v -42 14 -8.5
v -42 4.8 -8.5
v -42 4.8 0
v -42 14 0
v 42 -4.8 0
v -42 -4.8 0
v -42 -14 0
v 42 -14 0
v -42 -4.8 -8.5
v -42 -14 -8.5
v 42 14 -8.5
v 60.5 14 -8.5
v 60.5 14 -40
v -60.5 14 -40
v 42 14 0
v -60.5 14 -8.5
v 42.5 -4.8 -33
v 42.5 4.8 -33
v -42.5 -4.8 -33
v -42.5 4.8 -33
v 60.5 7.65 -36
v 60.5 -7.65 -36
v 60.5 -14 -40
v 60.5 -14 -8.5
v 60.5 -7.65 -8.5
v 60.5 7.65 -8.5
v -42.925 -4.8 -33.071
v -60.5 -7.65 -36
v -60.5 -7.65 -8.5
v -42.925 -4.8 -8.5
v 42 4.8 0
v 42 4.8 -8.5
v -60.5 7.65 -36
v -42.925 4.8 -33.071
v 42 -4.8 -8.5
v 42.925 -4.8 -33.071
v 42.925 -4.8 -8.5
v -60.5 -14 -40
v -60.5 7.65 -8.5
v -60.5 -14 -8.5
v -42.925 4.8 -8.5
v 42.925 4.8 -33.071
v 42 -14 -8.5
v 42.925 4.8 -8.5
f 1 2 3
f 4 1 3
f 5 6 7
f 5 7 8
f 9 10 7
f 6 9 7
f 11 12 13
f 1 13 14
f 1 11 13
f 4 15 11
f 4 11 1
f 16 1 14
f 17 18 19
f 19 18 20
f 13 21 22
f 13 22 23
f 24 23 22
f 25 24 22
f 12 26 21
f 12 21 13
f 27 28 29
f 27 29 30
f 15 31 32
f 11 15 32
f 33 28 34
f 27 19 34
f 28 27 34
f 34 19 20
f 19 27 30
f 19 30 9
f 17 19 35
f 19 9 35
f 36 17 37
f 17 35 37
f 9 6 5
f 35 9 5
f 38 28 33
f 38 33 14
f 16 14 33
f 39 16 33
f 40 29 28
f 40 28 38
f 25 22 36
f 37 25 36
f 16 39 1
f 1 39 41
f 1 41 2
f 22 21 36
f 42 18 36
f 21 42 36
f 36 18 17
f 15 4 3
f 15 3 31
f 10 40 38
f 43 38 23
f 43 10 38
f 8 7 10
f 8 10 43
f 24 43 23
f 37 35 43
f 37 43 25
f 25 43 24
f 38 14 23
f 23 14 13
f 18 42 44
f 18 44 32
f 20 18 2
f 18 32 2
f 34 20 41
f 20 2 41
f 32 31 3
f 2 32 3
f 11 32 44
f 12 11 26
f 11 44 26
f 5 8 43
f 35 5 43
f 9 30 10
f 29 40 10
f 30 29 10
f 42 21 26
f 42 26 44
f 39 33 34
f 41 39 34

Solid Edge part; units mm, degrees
sketch "Sketch1" plane through (0, 0, 0) normal (0, 0, 1) x (1, 0, 0)
  line L0 (-60.5, -14) -> (60.5, -14)
  line L1 (60.5, -14) -> (60.5, 14)
  line L2 (60.5, 14) -> (-60.5, 14)
  line L3 (-60.5, 14) -> (-60.5, -14)
extrude "Protrusion1" add sketch "Sketch1" against normal blind 40
sketch "Sketch2" plane through (0, -14, -20) normal (0, -1, 0) x (1, 0, 0)
  line L0 (60.5, 20) -> (42, 20)
  line L1 (42, 20) -> (42, 11.5)
  line L2 (42, 11.5) -> (60.5, 11.5)
  line L3 (60.5, 11.5) -> (60.5, 20)
extrude "ExtrudedCutout_11" cut sketch "Sketch2" against normal blind 28
sketch "Sketch3" plane through (0, -14, -20) normal (0, -1, 0) x (1, 0, 0)
  line L0 (-60.5, 11.5) -> (-42, 11.5)
  line L1 (-42, 11.5) -> (-42, 20)
  line L2 (-42, 20) -> (-60.5, 20)
  line L3 (-60.5, 20) -> (-60.5, 11.5)
extrude "ExtrudedCutout_12" cut sketch "Sketch3" against normal blind 28
sketch "Sketch4" plane through (0, 9.325, 0) normal (0, 0, 1) x (1, 0, 0)
  line L0 (60.5, -4.675) -> (60.5, -1.675)
  line L1 (60.5, -1.675) -> (42, -4.675)
  line L2 (42, -4.675) -> (60.5, -4.675)
extrude "ExtrudedCutout_23" cut sketch "Sketch4" against normal blind 33
sketch "Sketch5" plane through (0, -9.325, 0) normal (0, 0, 1) x (1, 0, 0)
  line L0 (60.5, 4.675) -> (60.5, 1.675)
  line L1 (60.5, 1.675) -> (42, 4.675)
  line L2 (42, 4.675) -> (60.5, 4.675)
  line L3 (-60.5, 13.975) -> (-60.5, 16.975)
  line L4 (-60.5, 16.975) -> (-42, 13.975)
  line L5 (-42, 13.975) -> (-60.5, 13.975)
extrude "ExtrudedCutout_24" cut sketch "Sketch5" against normal blind 33
sketch "Sketch6" plane through (0, -9.325, 0) normal (0, 0, 1) x (1, 0, 0)
  line L0 (-60.5, 4.675) -> (-60.5, 1.675)
  line L1 (-60.5, 1.675) -> (-42, 4.675)
  line L2 (-42, 4.675) -> (-60.5, 4.675)
extrude "ExtrudedCutout_26" cut sketch "Sketch6" against normal blind 33
sketch "Sketch7" plane through (0, 0, 0) normal (0, 0, 1) x (0, 1, 0)
  line L0 (-4.8, -60.5) -> (4.8, -60.5)
  line L1 (4.8, -60.5) -> (4.8, 60.5)
  line L2 (4.8, 60.5) -> (-4.8, 60.5)
  line L3 (-4.8, 60.5) -> (-4.8, -60.5)
extrude "ExtrudedCutout_27" cut sketch "Sketch7" against normal blind 33
chamfer "Chamfer_7" distance 3 distance2 18 1 edges at (60.5, 0, -33) measured on face at (60.5, -9.6133, -34.435)
chamfer "Chamfer_8" distance 3 distance2 18 1 edges at (-60.5, 0, -33) measured on face at (-60.5, 9.6133, -34.435)
